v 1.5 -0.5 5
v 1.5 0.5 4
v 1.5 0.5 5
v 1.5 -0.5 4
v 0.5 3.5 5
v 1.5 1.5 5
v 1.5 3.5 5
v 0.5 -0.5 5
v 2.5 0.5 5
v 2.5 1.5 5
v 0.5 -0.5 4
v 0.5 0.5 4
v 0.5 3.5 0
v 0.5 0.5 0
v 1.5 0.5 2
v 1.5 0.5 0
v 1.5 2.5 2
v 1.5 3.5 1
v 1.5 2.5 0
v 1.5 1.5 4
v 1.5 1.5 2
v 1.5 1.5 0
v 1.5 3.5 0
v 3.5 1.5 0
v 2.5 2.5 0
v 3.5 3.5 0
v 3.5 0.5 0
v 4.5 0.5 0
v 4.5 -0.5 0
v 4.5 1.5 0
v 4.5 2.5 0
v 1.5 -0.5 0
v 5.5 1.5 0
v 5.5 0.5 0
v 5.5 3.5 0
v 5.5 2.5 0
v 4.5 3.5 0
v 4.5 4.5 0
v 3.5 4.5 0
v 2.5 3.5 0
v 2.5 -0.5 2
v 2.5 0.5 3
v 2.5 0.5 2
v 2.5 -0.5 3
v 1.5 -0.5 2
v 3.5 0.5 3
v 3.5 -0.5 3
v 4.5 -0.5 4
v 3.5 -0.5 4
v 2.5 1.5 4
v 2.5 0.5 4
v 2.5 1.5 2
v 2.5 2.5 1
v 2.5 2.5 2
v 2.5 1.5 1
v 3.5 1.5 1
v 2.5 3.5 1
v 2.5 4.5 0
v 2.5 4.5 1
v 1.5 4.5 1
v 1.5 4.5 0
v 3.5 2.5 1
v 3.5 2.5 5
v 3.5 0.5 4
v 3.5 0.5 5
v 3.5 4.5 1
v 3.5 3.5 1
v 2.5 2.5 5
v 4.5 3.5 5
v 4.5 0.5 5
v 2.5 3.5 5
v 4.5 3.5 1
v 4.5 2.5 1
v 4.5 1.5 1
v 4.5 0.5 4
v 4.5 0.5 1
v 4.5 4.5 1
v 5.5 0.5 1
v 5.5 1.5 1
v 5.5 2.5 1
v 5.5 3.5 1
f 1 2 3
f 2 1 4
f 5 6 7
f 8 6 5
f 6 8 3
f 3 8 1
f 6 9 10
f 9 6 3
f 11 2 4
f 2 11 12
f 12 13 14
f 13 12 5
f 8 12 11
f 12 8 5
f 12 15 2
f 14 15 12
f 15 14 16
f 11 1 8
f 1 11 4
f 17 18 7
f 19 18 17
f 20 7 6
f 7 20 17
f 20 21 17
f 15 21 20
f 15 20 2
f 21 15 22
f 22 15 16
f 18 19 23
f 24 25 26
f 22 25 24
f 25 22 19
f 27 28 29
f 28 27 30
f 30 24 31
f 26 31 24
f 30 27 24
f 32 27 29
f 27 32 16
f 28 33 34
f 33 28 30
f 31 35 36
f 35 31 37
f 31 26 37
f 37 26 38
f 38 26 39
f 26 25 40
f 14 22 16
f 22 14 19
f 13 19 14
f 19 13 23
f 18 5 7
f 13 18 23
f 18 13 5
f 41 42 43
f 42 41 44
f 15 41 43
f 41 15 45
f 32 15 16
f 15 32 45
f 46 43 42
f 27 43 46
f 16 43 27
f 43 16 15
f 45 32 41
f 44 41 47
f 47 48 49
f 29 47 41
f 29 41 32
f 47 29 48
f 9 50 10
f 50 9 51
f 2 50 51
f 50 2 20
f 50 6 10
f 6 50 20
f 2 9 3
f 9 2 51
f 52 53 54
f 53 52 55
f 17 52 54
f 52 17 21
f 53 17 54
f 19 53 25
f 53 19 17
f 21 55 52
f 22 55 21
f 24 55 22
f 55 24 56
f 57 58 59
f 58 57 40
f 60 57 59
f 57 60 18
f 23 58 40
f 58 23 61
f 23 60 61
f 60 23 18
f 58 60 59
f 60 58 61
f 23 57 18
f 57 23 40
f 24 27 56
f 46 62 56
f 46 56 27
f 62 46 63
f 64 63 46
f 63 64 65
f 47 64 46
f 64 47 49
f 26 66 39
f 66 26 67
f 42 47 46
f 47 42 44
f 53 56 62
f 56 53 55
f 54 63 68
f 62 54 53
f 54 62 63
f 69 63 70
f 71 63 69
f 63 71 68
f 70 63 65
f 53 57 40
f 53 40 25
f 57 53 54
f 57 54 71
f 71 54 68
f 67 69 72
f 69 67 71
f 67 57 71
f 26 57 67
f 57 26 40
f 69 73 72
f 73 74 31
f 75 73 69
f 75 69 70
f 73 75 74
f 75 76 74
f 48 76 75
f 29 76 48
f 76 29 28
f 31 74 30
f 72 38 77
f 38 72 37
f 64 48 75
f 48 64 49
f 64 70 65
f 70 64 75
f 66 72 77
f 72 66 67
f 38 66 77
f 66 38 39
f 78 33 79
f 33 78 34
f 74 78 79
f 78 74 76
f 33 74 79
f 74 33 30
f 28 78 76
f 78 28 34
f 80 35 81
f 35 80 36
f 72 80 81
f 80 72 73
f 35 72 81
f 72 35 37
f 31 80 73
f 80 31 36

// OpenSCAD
union() {
    translate([1, 0, 4.5]) color([1, 0, 0]) cube([1, 1, 1], center=true);
    translate([1, 1, 2.5]) cube([1, 1, 5], center=true);
    translate([1, 2, 2.5]) cube([1, 1, 5], center=true);
    translate([1, 3, 2.5]) cube([1, 1, 5], center=true);
    translate([2, 0, 1.0]) cube([1, 1, 2], center=true);
    translate([2, 1, 4.5]) color([0, 0, 1]) cube([1, 1, 1], center=true);
    translate([2, 2, 1.0]) cube([1, 1, 2], center=true);
    translate([2, 4, 0.5]) cube([1, 1, 1], center=true);
    translate([3, 0, 1.5]) cube([1, 1, 3], center=true);
    translate([3, 2, 0.5]) cube([1, 1, 1], center=true);
    translate([3, 3, 2.5]) cube([1, 1, 5], center=true);
    translate([4, 0, 2.0]) cube([1, 1, 4], center=true);
    translate([4, 1, 2.5]) cube([1, 1, 5], center=true);
    translate([4, 2, 2.5]) cube([1, 1, 5], center=true);
    translate([4, 3, 2.5]) cube([1, 1, 5], center=true);
    translate([4, 4, 0.5]) cube([1, 1, 1], center=true);
    translate([5, 1, 0.5]) cube([1, 1, 1], center=true);
    translate([5, 3, 0.5]) cube([1, 1, 1], center=true);
}
